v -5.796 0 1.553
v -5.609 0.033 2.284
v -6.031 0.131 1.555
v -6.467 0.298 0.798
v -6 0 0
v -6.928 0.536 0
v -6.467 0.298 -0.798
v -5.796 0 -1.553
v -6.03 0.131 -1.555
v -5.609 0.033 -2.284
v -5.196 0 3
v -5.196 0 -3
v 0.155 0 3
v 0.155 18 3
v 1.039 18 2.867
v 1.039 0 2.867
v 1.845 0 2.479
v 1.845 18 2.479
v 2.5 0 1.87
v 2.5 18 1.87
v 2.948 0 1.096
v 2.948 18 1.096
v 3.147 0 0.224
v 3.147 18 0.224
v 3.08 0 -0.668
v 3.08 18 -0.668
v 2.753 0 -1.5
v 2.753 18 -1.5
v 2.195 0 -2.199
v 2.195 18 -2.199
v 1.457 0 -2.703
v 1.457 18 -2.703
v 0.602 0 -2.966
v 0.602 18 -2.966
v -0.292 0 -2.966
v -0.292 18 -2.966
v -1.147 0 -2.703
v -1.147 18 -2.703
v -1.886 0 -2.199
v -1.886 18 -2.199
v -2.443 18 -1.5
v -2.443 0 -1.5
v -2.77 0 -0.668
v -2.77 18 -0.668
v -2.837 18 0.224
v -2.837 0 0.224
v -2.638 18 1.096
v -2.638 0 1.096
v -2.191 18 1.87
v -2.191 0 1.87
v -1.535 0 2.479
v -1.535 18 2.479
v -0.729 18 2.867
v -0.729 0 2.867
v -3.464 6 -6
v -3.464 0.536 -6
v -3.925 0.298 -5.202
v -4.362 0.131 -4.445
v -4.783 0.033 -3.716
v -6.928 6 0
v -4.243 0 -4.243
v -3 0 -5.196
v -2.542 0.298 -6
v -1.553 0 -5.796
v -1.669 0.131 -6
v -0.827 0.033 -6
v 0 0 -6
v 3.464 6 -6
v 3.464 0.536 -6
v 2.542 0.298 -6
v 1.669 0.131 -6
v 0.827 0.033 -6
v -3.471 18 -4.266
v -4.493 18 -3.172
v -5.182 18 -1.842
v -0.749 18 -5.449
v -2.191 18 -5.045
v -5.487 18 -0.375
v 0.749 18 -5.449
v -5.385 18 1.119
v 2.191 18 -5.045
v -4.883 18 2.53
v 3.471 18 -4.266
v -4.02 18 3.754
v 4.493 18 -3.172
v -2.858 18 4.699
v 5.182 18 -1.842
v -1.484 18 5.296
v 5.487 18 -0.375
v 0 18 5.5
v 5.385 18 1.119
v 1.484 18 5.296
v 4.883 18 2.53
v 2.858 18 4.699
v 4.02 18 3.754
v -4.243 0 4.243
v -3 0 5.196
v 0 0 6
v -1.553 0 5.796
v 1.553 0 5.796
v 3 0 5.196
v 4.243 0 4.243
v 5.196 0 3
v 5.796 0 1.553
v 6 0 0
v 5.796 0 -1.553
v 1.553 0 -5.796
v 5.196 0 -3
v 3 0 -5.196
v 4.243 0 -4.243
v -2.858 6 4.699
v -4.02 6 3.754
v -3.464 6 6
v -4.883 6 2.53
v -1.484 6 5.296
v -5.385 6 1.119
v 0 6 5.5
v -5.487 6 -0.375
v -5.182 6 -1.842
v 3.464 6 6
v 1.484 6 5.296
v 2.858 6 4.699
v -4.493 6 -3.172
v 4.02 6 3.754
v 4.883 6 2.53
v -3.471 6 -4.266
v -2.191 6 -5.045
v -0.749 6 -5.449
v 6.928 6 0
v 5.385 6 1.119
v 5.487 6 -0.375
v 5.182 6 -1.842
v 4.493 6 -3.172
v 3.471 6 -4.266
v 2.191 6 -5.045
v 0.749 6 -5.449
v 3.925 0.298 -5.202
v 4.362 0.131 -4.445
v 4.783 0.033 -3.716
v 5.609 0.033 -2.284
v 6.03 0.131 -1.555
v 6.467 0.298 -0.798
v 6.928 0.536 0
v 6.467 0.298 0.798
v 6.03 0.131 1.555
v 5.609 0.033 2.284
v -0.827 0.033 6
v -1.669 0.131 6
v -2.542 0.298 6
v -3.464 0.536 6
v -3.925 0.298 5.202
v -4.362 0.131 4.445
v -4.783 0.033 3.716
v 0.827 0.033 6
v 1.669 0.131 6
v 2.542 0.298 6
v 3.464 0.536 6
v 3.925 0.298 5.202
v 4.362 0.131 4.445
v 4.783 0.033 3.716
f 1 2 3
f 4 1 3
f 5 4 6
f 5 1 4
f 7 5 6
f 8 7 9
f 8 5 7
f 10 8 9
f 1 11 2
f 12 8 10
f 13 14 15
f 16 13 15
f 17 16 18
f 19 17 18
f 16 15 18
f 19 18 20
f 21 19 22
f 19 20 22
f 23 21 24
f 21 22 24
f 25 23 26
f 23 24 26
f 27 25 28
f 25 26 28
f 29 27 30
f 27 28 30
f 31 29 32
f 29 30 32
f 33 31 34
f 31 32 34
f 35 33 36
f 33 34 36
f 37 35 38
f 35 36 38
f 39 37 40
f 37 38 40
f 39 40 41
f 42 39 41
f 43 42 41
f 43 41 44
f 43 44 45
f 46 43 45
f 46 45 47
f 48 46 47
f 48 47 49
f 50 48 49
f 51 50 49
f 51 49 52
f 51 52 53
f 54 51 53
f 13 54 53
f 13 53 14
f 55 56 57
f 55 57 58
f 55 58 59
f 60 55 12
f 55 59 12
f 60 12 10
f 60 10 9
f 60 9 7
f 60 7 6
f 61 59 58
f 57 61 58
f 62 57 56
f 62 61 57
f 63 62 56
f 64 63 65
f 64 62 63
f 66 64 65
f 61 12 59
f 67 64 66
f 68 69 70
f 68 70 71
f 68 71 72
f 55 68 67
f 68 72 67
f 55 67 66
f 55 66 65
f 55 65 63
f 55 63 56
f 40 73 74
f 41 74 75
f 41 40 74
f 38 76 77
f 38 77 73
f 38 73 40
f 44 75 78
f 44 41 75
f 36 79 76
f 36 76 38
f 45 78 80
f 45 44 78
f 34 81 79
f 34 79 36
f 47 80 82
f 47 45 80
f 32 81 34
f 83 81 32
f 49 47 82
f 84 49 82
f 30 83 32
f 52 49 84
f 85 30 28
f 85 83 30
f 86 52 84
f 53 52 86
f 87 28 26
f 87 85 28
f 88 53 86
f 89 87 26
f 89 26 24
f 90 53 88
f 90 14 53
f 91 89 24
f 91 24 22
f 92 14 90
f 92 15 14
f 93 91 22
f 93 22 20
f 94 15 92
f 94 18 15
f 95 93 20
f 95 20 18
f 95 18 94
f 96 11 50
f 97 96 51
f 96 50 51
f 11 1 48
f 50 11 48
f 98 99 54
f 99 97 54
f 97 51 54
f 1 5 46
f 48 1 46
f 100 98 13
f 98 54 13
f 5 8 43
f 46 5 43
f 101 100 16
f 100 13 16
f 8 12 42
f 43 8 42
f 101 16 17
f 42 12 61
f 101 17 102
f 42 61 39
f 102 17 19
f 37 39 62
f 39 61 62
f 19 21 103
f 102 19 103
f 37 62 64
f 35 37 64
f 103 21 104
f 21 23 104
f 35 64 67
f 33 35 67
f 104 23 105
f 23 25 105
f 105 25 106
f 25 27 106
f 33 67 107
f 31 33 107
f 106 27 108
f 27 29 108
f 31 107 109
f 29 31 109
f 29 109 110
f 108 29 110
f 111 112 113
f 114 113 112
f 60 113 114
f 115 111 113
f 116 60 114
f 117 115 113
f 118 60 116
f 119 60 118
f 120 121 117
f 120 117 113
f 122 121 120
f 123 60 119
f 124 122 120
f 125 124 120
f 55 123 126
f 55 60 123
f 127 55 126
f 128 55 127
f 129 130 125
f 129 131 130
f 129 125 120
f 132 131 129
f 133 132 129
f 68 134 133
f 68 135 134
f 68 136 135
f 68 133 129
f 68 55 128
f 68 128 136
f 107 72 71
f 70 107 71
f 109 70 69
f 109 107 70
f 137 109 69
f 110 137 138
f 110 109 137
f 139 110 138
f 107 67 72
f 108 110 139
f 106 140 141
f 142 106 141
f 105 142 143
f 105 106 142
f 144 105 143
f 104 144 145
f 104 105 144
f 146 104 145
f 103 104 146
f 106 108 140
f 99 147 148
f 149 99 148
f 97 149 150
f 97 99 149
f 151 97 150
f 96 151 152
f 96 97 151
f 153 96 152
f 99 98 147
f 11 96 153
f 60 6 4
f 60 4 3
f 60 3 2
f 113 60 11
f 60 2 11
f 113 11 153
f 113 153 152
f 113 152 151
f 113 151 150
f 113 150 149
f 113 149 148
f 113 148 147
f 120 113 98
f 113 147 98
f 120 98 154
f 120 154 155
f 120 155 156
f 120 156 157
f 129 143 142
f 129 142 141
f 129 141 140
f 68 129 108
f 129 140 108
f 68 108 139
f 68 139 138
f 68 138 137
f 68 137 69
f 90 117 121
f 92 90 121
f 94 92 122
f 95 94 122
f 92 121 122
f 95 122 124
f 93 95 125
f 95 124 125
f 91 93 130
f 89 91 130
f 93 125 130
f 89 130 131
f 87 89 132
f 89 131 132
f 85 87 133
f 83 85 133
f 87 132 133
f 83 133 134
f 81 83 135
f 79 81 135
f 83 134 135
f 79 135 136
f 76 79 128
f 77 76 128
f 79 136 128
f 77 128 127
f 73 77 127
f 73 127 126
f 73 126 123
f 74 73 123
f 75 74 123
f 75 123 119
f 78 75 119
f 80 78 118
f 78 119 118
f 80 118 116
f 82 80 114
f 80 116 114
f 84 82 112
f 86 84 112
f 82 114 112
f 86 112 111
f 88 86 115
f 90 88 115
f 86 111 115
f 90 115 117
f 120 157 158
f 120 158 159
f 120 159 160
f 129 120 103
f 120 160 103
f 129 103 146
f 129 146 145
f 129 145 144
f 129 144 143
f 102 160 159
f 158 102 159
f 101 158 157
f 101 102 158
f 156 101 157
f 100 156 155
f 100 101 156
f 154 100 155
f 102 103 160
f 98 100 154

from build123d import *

# Parameters (mm, degrees)
EXTRUDE_1_DEPTH     = 6
SKETCH_2_R          = 5.5
EXTRUDE_2_DEPTH     = 12
SKETCH_3_R          = 3
CUT_EXTRUDE_1_DEPTH = 21.199009877
SKETCH_4_OUTSIDE_W  = 55.636
SKETCH_4_OUTSIDE_H  = 53.78
SKETCH_4_OUTSIDE_R  = 6
CUT_EXTRUDE_2_DEPTH = 10
CUT_EXTRUDE_2_DRAFT = -60


with BuildPart() as part:
    # 草图1 → 凸台-拉伸1 (new body)
    with BuildSketch(Plane(origin=(0, 0, 0), x_dir=(1, 0, 0), z_dir=(0, 1, 0))):
        Polygon((6.92820323, 0), (3.464101615, 6), (-3.464101615, 6), (-6.92820323, 0), (-3.464101615, -6), (3.464101615, -6), align=None)
    extrude(amount=EXTRUDE_1_DEPTH)

    # 草图2 → 凸台-拉伸2 (add)
    with BuildSketch(Plane(origin=(0, 6, 0), x_dir=(1, 0, 0), z_dir=(0, 1, 0))):
        with Locations(Location((0, 0, 0), (0, 0, 270))):
            Circle(SKETCH_2_R)
    extrude(amount=EXTRUDE_2_DEPTH)

    # 草图3 → 切除-拉伸1 (cut, through all)
    with BuildSketch(Plane(origin=(0, 18, 0), x_dir=(1, 0, 0), z_dir=(0, 1, 0))):
        with Locations(Location((0.154901244, 0, 0), (0, 0, 270))):
            Circle(SKETCH_3_R)
    extrude(amount=-CUT_EXTRUDE_1_DEPTH, mode=Mode.SUBTRACT)


with BuildPart() as cut_extrude_2_tool:
    # 草图4 outside → 切除-拉伸2 (with draft: the straight prism first)
    with BuildSketch(Plane.XZ):
        Rectangle(SKETCH_4_OUTSIDE_W, SKETCH_4_OUTSIDE_H)
        Circle(SKETCH_4_OUTSIDE_R, mode=Mode.SUBTRACT)
    extrude(amount=-CUT_EXTRUDE_2_DEPTH)
    # 切除-拉伸2: the draft: its side faces are tilted about the plane it starts from
    cut_extrude_2_sides = [cut_extrude_2_tool.faces().sort_by_distance(p)[0] for p in [
        (0, 5, -26.89),
        (27.818, 5, 0),
        (0, 5, 26.89),
        (-27.818, 5, 0),
        (-6, 5, 0),
    ]]
    draft(cut_extrude_2_sides, Plane.XZ, CUT_EXTRUDE_2_DRAFT)


with BuildPart() as part_1:
    add(part.part)

    # 切除-拉伸2: cut by cut_extrude_2_tool
    add(cut_extrude_2_tool.part, mode=Mode.SUBTRACT)


solid = part_1.part
